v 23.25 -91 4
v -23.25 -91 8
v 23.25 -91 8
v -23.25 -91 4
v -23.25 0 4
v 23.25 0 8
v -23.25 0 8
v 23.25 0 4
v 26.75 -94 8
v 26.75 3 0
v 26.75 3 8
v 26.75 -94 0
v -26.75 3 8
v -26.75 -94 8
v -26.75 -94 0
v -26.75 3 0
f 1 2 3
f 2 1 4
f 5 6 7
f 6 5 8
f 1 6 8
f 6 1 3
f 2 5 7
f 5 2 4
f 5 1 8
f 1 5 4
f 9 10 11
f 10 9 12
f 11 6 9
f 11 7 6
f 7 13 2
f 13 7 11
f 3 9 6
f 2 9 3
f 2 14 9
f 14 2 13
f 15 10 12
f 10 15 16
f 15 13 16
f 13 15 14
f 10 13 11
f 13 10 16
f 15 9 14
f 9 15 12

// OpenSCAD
module case(l=86, h=24, w=47, lcd_l=43, lcd_w=20, lcd_h=8)
{
    difference()
    {
        union()
        {
            translate([0,h,0]) scale([1,1,1]) cylinder(r=w/2, h=l);
            translate([-w/2,0,0]) cube([w,h,l]);
            translate([-lcd_w/2,h,0]) cube([lcd_w,lcd_l,lcd_h]);
            translate([0,h+lcd_l,0]) scale([1,1,1]) cylinder(r=lcd_w/2, h=lcd_h);
        }
        translate([-50,-10,0]) cube([100,10,100]);
    }
}


l=87;
h=20;
w=41.5;
lcd_l=40;
lcd_w=16;
lcd_h=4;

module hull()
{
    rotate([90,0,0]) difference()
    {
        case(l=l+4, h=h, w=w+4, lcd_l=lcd_l, lcd_w=lcd_w+4, lcd_h=lcd_h+4);
        union()
        {
            translate([0,0,2]) case(l=l, h=h, w=w, lcd_l=lcd_l, lcd_w=lcd_w, lcd_h=lcd_h);
            translate([-11/2,27,0]) cube([11,27,2]);
            translate([-8.7, 0, 63]) rotate([-90,0,0]) cylinder(r=5/2, h=60);
            translate([6,25.3,80]) cube([9, 3, 40], center=true);
        }
        //translate([-50,-10,0]) cube([100,10,100]);
        //cube([w, h*10, l]);
    }
}

module base()
{
    W = w + 12;
    L = l + 10;
    
    difference()
    {
        translate([-W/2,-L + 3,0]) cube([W, L, 8]);
        translate([0,0,4]) rotate([90,0,0]) case(l=l+4, h=h, w=w+5, lcd_l=lcd_l, lcd_w=lcd_w+4, lcd_h=lcd_h+4);
        //translate([-w/2,-l-2,5]) cube([w, l+2, 8]);
    }
}

base();
